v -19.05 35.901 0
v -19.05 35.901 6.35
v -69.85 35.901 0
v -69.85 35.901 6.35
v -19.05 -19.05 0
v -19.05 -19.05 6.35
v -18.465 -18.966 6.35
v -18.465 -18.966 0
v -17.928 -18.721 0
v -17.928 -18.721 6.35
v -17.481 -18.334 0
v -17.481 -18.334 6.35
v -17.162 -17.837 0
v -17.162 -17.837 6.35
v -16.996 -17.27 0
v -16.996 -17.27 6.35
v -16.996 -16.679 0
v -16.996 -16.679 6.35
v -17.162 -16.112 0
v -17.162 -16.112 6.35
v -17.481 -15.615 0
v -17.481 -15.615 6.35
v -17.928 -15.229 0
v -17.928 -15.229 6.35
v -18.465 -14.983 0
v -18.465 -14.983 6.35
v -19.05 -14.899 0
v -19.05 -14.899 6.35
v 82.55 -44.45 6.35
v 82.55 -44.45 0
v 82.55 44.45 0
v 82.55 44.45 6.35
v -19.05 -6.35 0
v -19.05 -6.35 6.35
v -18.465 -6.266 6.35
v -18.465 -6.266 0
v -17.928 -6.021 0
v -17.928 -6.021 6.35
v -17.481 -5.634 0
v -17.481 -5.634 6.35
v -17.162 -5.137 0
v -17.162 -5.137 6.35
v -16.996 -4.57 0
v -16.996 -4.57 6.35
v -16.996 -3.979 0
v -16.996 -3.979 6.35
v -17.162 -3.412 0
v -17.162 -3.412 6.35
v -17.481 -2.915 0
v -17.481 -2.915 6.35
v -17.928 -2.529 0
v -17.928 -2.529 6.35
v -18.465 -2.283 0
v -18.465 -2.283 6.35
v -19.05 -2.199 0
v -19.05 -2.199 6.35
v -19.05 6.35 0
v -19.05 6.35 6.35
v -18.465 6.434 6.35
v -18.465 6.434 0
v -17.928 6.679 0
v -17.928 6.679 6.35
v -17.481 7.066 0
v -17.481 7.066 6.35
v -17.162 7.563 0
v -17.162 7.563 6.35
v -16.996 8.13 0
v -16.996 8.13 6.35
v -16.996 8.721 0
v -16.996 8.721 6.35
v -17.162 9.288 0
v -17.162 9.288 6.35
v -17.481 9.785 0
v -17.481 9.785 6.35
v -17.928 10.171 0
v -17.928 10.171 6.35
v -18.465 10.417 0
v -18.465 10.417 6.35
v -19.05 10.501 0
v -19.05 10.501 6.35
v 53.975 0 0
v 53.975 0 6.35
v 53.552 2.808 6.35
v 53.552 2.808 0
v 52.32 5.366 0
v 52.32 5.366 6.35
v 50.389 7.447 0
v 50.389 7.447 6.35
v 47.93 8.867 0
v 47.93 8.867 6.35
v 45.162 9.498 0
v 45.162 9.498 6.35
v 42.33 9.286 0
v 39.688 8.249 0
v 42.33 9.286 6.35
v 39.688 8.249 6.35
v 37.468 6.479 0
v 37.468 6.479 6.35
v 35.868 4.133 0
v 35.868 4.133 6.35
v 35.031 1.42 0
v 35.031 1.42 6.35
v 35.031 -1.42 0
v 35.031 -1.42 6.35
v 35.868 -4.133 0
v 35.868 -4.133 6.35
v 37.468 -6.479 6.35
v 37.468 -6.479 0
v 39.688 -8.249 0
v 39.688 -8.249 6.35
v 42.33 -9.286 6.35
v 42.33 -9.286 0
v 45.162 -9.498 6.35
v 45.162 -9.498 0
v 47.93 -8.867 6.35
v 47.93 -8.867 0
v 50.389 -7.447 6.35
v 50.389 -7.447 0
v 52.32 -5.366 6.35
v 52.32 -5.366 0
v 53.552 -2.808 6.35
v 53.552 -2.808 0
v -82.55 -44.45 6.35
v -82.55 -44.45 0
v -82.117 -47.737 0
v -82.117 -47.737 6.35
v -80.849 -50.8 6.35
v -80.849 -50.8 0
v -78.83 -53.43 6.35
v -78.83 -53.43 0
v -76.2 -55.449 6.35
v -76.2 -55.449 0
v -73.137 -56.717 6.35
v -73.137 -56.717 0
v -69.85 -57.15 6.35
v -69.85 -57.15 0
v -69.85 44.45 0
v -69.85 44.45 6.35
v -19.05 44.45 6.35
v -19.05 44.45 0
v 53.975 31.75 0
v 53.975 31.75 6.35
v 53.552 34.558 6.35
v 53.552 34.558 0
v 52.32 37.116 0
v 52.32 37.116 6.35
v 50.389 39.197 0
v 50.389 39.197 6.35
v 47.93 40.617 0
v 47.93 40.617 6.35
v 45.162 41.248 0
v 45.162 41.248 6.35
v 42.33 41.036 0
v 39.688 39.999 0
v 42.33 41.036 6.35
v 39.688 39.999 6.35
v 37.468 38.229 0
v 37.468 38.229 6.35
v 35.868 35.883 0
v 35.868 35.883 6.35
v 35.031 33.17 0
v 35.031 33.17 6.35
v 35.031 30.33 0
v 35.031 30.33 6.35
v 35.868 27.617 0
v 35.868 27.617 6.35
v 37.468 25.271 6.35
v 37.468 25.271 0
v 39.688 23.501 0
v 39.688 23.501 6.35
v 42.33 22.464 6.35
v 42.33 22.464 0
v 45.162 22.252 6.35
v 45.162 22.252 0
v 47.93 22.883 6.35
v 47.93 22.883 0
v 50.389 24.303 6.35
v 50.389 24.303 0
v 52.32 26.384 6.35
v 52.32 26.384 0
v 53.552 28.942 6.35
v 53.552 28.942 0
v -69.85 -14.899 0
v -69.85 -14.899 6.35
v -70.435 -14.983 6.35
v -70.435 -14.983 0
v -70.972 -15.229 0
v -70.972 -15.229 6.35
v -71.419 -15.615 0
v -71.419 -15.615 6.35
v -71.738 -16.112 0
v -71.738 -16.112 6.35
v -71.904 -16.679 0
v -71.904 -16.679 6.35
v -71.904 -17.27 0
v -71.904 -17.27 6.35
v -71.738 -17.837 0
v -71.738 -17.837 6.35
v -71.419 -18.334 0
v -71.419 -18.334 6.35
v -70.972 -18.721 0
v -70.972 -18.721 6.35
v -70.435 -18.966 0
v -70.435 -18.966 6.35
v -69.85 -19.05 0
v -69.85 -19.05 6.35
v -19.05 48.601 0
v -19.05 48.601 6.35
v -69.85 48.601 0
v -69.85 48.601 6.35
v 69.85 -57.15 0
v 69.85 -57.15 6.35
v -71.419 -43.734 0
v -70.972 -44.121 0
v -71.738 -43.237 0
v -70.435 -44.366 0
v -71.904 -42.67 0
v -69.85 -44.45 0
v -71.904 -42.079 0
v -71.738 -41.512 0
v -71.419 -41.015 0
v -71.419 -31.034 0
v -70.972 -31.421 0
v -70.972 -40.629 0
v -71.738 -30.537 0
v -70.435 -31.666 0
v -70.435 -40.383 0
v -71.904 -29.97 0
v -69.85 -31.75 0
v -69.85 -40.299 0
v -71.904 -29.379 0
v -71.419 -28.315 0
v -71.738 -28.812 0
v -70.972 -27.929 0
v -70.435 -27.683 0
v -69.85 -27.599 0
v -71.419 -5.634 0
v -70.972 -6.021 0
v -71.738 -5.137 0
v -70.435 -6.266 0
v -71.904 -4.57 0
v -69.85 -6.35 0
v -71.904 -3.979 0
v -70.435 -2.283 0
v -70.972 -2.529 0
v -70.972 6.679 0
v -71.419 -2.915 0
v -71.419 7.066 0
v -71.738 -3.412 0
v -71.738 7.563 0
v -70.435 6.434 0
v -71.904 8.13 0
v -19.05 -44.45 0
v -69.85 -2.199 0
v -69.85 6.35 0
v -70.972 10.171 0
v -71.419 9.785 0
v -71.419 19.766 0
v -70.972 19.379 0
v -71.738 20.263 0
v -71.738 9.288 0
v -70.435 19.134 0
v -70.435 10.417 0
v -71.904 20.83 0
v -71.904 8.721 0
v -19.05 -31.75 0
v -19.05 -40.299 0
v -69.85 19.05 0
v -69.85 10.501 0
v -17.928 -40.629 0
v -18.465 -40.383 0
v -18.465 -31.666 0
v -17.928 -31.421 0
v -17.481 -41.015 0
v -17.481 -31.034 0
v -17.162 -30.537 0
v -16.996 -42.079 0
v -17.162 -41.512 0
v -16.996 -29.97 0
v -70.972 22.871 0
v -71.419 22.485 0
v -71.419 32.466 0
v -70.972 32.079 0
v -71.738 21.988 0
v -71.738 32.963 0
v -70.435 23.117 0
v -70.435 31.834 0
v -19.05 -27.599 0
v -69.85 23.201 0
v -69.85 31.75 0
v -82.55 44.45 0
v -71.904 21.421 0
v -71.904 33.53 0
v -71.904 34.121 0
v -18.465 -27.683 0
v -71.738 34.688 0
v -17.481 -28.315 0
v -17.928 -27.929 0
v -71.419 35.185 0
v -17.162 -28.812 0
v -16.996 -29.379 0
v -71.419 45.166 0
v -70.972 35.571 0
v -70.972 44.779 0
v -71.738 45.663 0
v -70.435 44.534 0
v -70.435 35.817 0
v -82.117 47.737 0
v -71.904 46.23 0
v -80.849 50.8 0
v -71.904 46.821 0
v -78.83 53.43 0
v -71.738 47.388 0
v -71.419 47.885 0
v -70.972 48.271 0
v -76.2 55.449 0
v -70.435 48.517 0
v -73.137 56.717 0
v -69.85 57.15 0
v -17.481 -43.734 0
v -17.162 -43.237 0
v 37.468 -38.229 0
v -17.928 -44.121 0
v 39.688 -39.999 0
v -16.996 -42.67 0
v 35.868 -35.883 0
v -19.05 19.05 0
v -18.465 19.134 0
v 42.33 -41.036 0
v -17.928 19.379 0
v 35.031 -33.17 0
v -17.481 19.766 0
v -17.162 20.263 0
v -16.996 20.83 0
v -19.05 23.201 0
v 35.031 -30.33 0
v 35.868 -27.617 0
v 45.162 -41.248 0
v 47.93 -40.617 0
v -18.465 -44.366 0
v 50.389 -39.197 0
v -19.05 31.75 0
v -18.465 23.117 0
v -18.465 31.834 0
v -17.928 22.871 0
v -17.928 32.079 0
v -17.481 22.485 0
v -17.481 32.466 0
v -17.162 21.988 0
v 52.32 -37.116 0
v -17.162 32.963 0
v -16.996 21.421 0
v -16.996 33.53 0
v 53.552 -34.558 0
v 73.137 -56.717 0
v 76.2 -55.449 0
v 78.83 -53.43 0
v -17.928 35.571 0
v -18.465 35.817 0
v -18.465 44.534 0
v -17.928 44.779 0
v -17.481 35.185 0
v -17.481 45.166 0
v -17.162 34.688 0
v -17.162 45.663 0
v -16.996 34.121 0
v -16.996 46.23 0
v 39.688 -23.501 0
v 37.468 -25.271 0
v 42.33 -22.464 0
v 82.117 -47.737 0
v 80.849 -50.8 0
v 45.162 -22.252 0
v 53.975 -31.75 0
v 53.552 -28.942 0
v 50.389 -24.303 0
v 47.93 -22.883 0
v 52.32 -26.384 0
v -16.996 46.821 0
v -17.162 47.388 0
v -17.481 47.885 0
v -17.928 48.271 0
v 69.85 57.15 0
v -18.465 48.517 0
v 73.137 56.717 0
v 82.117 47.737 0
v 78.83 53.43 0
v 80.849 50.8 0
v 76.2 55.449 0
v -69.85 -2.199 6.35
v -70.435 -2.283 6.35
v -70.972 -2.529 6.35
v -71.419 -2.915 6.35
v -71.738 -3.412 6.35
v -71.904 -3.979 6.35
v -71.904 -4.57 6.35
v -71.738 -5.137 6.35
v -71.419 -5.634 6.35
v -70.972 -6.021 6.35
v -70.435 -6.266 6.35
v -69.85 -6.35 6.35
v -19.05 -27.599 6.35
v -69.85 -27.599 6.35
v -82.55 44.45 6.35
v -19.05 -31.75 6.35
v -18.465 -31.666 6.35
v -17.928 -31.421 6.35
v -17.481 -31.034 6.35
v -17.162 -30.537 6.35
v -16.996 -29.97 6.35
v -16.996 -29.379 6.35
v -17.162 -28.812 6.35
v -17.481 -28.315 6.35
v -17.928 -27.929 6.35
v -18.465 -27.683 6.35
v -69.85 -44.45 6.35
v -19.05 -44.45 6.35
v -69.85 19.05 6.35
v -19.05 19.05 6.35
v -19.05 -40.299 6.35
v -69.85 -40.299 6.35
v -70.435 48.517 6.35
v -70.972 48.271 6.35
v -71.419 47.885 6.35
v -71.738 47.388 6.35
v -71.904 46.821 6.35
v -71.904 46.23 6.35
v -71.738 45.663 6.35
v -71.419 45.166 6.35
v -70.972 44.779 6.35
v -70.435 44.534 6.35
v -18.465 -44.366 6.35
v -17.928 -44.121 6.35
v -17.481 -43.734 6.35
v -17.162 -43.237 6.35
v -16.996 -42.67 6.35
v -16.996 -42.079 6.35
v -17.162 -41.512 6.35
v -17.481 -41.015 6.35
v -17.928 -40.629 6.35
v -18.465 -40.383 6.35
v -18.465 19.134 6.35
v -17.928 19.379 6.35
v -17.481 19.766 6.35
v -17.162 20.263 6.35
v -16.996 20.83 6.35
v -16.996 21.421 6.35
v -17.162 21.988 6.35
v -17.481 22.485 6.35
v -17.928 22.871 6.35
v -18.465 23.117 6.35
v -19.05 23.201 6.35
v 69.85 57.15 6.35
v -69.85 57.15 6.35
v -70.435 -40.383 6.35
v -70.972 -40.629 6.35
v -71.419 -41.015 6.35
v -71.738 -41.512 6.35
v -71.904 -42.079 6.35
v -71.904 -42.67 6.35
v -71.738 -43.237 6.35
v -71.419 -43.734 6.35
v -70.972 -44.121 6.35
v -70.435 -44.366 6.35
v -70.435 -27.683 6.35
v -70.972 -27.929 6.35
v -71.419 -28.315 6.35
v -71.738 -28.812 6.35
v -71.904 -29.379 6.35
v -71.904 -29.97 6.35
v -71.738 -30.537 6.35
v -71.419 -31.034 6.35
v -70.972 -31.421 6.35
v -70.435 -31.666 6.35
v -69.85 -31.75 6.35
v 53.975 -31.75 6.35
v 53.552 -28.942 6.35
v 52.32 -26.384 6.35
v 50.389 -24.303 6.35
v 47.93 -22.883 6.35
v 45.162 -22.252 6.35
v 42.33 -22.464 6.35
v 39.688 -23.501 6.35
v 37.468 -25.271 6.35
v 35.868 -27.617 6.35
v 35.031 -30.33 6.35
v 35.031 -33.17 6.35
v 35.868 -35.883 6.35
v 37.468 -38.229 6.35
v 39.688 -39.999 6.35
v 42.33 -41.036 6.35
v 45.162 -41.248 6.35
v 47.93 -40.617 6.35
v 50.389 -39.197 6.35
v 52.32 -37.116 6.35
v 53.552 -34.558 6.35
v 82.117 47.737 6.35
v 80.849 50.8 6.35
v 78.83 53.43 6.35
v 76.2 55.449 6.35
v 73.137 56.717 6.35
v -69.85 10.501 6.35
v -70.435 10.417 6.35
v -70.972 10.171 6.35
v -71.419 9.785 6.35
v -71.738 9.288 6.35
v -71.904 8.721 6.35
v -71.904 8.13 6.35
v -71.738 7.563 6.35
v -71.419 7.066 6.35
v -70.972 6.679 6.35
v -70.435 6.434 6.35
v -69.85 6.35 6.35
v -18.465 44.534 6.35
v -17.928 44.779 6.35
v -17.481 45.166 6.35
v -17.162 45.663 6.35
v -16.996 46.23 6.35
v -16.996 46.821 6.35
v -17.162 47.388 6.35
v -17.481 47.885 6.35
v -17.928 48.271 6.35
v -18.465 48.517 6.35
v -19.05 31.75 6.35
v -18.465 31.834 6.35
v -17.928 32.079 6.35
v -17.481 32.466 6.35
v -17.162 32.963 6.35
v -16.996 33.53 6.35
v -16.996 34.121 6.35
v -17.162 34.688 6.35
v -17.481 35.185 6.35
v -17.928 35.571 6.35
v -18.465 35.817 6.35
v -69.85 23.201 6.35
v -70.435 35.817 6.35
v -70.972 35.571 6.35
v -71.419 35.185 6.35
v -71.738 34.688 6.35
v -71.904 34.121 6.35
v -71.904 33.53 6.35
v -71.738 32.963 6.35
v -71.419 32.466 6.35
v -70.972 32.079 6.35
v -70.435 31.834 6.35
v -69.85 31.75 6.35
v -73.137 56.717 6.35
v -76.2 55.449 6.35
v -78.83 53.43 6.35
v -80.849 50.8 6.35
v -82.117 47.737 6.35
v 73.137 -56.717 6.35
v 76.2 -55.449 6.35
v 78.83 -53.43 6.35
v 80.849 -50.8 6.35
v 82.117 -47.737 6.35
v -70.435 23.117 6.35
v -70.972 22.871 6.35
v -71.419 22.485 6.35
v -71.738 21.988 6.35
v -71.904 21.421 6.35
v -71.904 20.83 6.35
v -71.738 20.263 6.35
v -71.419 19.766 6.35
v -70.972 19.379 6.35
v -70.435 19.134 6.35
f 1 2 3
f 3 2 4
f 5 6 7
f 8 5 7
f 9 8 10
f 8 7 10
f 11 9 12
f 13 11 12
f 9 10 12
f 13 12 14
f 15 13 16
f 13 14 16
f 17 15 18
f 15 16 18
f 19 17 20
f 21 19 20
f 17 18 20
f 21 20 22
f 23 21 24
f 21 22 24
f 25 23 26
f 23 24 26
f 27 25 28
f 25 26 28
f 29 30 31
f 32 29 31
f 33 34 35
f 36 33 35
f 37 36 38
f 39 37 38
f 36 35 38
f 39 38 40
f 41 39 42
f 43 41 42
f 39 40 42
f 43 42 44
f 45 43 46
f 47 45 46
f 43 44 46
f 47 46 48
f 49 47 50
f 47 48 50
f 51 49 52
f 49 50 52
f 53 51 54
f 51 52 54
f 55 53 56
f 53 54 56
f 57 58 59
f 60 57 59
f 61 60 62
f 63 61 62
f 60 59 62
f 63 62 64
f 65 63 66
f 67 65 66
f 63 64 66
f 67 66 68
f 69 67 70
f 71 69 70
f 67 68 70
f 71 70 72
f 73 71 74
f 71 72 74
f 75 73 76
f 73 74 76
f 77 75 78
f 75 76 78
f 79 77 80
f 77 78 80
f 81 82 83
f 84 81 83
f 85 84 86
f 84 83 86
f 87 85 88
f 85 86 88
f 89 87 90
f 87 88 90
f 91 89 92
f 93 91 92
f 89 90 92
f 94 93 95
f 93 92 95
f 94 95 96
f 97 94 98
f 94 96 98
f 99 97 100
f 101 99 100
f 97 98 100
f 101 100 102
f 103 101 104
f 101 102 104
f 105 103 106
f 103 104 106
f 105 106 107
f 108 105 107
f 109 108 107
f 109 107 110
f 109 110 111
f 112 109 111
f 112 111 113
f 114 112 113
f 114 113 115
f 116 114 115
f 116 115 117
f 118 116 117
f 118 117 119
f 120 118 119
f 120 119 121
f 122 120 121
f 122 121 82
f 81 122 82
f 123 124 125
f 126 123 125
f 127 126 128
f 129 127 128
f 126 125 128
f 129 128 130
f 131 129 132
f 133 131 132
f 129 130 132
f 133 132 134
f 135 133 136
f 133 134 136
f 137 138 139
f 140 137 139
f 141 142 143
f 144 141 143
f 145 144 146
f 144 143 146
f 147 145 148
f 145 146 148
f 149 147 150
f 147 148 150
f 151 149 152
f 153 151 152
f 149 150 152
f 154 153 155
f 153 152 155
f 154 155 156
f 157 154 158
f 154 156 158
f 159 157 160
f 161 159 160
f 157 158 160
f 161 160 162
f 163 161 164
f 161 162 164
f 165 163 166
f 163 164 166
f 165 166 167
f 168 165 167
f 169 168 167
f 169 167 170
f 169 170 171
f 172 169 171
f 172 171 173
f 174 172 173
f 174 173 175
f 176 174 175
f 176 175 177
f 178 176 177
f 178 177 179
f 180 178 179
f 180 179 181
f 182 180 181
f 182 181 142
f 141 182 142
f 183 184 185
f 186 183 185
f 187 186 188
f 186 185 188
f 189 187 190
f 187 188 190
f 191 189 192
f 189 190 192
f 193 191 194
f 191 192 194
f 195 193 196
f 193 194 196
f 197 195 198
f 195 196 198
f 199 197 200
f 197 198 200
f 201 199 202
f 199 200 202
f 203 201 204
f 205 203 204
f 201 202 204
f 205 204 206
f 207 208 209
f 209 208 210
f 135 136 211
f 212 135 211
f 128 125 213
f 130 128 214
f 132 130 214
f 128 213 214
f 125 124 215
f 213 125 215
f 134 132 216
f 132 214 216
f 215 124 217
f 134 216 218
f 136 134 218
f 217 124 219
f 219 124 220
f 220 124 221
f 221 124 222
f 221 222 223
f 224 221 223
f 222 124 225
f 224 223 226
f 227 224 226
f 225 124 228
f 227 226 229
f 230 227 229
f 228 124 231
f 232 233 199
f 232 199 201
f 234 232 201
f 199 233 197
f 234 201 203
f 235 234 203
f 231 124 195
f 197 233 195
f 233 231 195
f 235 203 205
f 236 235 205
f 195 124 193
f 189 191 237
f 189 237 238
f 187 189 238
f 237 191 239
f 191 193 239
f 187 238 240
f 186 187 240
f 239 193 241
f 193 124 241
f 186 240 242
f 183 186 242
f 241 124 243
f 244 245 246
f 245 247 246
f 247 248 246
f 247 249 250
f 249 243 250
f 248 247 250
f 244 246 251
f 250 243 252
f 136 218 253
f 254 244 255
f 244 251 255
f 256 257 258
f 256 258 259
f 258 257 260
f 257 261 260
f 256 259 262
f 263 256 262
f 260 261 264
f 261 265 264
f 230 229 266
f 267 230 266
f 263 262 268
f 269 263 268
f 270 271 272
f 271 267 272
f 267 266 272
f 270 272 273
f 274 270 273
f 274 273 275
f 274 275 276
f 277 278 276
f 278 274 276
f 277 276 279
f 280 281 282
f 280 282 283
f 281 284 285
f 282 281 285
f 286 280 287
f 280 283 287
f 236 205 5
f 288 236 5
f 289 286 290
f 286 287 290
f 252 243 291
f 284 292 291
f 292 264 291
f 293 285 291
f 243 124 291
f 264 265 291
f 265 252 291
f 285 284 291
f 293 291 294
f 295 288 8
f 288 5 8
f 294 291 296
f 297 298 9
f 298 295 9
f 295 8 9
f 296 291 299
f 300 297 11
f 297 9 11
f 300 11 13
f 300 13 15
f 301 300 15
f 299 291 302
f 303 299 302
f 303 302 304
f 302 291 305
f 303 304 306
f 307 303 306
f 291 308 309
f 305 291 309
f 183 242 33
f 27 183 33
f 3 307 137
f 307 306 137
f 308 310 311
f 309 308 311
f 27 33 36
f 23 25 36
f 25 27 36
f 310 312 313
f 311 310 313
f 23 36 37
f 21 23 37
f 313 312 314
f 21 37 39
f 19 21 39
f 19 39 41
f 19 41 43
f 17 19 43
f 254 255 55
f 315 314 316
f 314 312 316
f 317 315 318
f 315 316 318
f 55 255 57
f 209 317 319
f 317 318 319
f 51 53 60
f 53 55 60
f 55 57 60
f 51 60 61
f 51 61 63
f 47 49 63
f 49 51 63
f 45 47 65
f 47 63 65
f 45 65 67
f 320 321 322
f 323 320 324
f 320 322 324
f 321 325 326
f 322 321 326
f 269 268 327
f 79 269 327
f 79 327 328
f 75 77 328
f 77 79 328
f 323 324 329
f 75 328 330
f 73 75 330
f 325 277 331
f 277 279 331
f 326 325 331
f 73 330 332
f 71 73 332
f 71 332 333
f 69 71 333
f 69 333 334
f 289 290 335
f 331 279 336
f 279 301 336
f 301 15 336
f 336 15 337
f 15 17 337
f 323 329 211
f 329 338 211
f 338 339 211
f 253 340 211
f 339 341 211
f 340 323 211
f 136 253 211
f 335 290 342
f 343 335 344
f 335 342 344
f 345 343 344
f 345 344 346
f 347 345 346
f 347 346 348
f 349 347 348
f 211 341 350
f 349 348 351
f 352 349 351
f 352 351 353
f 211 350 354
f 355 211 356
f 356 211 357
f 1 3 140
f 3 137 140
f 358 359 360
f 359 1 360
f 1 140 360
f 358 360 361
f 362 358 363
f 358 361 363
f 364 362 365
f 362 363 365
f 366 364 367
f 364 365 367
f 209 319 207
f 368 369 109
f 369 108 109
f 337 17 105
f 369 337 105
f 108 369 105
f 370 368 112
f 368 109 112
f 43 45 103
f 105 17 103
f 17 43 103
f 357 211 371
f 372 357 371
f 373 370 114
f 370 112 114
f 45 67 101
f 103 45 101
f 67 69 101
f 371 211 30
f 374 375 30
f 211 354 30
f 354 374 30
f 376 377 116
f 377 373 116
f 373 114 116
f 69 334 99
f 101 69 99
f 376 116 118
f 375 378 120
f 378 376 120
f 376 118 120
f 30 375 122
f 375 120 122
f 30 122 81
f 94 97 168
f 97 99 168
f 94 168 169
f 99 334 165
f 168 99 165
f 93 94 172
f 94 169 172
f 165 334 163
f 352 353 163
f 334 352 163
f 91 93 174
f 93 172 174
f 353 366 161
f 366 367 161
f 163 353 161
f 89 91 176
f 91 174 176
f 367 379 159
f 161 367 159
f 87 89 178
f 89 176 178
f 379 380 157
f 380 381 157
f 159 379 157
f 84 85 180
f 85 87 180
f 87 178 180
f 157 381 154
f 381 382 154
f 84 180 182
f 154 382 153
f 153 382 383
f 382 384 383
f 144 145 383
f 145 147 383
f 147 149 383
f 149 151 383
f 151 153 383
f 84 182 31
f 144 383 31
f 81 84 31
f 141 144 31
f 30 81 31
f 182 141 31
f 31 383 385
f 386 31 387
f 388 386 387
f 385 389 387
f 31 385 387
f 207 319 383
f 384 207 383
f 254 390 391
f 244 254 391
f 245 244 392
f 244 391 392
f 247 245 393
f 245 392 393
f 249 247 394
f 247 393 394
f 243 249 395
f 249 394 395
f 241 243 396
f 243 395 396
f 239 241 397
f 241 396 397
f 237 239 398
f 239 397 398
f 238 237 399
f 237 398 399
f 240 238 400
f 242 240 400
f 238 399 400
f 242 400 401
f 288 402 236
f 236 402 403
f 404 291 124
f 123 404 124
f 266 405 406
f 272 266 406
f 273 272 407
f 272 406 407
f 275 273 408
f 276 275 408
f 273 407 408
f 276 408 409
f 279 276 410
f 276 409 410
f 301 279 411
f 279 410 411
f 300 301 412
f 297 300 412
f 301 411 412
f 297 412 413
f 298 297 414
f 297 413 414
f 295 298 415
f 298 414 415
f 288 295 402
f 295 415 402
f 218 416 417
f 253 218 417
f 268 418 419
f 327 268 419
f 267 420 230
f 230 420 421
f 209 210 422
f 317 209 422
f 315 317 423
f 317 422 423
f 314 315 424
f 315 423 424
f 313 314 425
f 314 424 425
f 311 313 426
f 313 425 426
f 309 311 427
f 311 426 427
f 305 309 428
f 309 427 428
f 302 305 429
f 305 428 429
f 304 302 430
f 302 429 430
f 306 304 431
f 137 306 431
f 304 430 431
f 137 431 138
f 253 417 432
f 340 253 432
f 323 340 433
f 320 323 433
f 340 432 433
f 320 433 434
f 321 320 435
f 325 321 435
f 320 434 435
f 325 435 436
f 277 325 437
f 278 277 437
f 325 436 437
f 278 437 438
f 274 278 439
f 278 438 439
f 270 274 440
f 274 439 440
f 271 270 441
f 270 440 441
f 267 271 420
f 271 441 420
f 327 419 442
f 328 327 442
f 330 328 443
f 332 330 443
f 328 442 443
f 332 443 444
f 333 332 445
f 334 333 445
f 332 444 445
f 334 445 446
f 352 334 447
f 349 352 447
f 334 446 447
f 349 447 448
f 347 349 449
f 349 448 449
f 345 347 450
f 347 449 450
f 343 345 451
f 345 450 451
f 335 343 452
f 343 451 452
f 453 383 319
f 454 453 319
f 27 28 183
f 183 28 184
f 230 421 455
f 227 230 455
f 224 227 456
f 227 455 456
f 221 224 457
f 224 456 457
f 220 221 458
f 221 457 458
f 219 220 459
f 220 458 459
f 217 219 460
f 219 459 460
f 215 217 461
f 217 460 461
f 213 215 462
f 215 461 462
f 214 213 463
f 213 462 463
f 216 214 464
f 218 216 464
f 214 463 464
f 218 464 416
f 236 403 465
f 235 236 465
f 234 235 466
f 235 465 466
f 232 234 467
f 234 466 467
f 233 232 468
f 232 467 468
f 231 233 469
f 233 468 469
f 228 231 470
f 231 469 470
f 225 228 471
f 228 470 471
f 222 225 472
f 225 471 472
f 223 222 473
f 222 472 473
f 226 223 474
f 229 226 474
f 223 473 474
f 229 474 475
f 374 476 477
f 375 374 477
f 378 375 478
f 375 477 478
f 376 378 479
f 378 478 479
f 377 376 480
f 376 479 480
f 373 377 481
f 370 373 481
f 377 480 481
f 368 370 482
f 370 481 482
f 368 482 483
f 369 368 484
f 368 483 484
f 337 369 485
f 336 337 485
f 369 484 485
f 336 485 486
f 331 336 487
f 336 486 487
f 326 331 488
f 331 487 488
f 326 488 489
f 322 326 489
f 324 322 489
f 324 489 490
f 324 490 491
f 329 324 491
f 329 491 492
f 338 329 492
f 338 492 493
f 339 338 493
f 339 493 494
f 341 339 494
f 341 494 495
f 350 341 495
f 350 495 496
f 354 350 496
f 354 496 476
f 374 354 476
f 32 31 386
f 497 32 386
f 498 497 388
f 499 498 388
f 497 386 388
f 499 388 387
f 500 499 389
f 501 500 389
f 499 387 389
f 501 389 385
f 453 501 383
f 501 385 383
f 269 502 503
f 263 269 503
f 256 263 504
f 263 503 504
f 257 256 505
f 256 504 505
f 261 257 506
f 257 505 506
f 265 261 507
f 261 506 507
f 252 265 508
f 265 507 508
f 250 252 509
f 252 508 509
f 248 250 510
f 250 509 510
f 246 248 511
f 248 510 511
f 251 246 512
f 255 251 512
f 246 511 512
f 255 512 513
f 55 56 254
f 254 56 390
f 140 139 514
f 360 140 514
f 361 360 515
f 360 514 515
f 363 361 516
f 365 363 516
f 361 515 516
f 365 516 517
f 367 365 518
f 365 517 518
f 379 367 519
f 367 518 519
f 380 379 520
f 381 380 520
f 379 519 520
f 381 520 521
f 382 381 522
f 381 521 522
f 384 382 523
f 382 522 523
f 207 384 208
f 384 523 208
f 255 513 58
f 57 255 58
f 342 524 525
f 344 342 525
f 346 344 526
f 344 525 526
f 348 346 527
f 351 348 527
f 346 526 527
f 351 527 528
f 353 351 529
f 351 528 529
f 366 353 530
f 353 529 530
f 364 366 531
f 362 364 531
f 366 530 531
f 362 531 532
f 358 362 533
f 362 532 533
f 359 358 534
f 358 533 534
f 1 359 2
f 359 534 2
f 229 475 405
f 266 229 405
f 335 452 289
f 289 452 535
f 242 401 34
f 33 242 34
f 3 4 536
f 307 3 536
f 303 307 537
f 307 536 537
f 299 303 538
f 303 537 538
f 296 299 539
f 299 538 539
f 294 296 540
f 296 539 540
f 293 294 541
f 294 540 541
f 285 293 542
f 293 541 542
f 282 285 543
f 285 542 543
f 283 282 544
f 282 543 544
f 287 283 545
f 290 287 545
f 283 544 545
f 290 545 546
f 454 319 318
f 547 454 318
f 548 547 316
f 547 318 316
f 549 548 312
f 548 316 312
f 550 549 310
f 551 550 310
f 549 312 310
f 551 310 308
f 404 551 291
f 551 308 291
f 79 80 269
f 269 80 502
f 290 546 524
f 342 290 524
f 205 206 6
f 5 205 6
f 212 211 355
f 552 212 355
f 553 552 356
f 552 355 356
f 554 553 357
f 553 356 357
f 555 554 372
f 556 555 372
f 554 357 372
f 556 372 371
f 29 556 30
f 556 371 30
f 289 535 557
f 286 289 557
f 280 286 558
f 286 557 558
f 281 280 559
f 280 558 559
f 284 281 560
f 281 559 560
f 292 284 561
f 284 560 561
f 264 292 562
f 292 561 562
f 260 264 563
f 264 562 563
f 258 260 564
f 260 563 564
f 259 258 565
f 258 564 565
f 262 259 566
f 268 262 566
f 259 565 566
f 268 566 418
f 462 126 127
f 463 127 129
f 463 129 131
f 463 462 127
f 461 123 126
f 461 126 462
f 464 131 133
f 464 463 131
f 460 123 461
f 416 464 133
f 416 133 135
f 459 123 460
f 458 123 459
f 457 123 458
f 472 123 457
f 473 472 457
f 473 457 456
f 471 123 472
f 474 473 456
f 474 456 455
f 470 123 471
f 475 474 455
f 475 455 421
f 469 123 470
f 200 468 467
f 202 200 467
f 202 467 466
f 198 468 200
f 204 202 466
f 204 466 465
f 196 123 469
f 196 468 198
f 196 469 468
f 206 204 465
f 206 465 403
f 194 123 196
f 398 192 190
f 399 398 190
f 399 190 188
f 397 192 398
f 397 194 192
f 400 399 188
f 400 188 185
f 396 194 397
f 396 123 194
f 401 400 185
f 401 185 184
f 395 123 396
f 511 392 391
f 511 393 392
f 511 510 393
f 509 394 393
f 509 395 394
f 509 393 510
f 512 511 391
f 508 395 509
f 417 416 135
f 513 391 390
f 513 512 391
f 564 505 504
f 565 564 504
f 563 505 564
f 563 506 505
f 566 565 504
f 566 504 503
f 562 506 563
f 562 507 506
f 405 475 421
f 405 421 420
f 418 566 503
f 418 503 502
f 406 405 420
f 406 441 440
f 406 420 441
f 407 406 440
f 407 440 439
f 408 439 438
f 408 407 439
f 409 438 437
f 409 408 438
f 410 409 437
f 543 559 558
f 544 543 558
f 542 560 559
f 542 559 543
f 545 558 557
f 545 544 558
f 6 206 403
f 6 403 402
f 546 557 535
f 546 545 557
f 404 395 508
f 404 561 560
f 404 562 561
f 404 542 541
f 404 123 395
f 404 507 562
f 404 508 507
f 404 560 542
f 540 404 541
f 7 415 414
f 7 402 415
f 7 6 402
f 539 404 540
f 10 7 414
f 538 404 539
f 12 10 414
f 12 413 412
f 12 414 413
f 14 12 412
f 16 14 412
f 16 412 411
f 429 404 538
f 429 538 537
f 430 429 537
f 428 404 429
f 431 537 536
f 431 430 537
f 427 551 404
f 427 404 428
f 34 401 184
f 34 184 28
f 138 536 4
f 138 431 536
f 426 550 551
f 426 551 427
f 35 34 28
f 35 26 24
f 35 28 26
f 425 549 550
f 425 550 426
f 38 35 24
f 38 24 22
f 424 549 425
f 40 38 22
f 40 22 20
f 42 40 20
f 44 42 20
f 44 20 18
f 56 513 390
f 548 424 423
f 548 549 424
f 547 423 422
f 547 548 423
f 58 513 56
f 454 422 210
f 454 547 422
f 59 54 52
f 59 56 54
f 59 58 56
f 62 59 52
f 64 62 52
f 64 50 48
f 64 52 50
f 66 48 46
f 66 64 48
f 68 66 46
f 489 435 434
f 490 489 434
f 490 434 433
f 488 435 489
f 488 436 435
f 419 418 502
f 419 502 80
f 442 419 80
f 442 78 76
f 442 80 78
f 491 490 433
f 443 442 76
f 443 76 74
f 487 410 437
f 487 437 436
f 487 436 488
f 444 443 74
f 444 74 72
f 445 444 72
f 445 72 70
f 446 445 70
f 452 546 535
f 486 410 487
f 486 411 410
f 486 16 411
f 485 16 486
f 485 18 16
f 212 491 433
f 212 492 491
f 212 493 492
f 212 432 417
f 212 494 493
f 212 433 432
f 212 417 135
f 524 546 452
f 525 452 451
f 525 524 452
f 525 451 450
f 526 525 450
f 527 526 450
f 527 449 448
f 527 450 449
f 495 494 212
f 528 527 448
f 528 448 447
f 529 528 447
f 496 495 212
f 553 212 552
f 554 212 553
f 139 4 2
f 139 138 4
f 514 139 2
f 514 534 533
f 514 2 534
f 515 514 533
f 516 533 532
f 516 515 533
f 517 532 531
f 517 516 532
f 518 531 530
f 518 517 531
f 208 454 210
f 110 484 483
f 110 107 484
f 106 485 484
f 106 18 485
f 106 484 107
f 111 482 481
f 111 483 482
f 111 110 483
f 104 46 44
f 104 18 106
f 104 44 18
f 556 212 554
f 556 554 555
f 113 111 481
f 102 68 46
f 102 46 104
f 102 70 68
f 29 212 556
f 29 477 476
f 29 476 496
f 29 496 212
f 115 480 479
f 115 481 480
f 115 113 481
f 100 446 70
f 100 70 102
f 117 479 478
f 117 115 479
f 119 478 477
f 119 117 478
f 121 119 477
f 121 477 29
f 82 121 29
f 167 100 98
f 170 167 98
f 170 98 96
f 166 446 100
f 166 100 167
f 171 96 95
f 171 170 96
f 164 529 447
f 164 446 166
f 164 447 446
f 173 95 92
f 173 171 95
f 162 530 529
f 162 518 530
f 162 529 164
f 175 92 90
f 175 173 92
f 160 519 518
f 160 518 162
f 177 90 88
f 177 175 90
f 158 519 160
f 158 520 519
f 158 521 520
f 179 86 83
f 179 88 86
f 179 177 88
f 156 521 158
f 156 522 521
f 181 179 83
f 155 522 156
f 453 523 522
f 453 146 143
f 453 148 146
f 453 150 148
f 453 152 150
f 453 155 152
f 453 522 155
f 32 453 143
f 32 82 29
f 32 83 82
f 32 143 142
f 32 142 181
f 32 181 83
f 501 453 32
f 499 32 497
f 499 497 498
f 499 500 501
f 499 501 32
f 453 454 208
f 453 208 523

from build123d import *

# Parameters (mm, degrees)
F1_DEPTH = 6.35
F3_DEPTH = 6.351
F4_R     = 9.525
F5_DEPTH = 6.351


with BuildPart() as f1:
    # F0 (on Top) → F1 (new body)
    with BuildSketch(Plane.XY):
        with BuildLine():
            ThreePointArc((82.55, 44.45), (78.830256, 53.430256), (69.85, 57.15))
            Line((69.85, 57.15), (-69.85, 57.15))
            ThreePointArc((-69.85, 57.15), (-78.830256, 53.430256), (-82.55, 44.45))
            Line((-82.55, 44.45), (-82.55, -44.45))
            ThreePointArc((-82.55, -44.45), (-78.830256, -53.430256), (-69.85, -57.15))
            Line((-69.85, -57.15), (69.85, -57.15))
            ThreePointArc((69.85, -57.15), (78.830256, -53.430256), (82.55, -44.45))
            Line((82.55, -44.45), (82.55, 44.45))
        make_face()
    extrude(amount=F1_DEPTH)

    # F2 (on face) → F3 (cut, through all)
    with BuildSketch(Plane.XY.offset(6.35)):
        with BuildLine():
            ThreePointArc((-69.85, -40.299123), (-71.925438, -42.374562), (-69.85, -44.45))
            Line((-69.85, -44.45), (-19.05, -44.45))
            ThreePointArc((-19.05, -44.45), (-16.974562, -42.374562), (-19.05, -40.299123))
            Line((-19.05, -40.299123), (-69.85, -40.299123))
        make_face()
        with BuildLine():
            Line((-19.05, -27.599123), (-69.85, -27.599123))
            ThreePointArc((-69.85, -27.599123), (-71.925438, -29.674562), (-69.85, -31.75))
            Line((-69.85, -31.75), (-19.05, -31.75))
            ThreePointArc((-19.05, -31.75), (-16.974562, -29.674562), (-19.05, -27.599123))
        make_face()
        with BuildLine():
            Line((-19.05, -14.899123), (-69.85, -14.899123))
            ThreePointArc((-69.85, -14.899123), (-71.925438, -16.974562), (-69.85, -19.05))
            Line((-69.85, -19.05), (-19.05, -19.05))
            ThreePointArc((-19.05, -19.05), (-16.974562, -16.974562), (-19.05, -14.899123))
        make_face()
        with BuildLine():
            Line((-19.05, -2.199123), (-69.85, -2.199123))
            ThreePointArc((-69.85, -2.199123), (-71.925438, -4.274562), (-69.85, -6.35))
            Line((-69.85, -6.35), (-19.05, -6.35))
            ThreePointArc((-19.05, -6.35), (-16.974562, -4.274562), (-19.05, -2.199123))
        make_face()
        with BuildLine():
            Line((-19.05, 10.500877), (-69.85, 10.500877))
            ThreePointArc((-69.85, 10.500877), (-71.925438, 8.425438), (-69.85, 6.35))
            Line((-69.85, 6.35), (-19.05, 6.35))
            ThreePointArc((-19.05, 6.35), (-16.974562, 8.425438), (-19.05, 10.500877))
        make_face()
        with BuildLine():
            Line((-19.05, 23.200877), (-69.85, 23.200877))
            ThreePointArc((-69.85, 23.200877), (-71.925438, 21.125438), (-69.85, 19.05))
            Line((-69.85, 19.05), (-19.05, 19.05))
            ThreePointArc((-19.05, 19.05), (-16.974562, 21.125438), (-19.05, 23.200877))
        make_face()
        with BuildLine():
            Line((-19.05, 35.900877), (-69.85, 35.900877))
            ThreePointArc((-69.85, 35.900877), (-71.925438, 33.825438), (-69.85, 31.75))
            Line((-69.85, 31.75), (-19.05, 31.75))
            ThreePointArc((-19.05, 31.75), (-16.974562, 33.825438), (-19.05, 35.900877))
        make_face()
        with BuildLine():
            Line((-19.05, 48.600877), (-69.85, 48.600877))
            ThreePointArc((-69.85, 48.600877), (-71.925438, 46.525438), (-69.85, 44.45))
            Line((-69.85, 44.45), (-19.05, 44.45))
            ThreePointArc((-19.05, 44.45), (-16.974562, 46.525438), (-19.05, 48.600877))
        make_face()
    extrude(amount=-F3_DEPTH, mode=Mode.SUBTRACT)

    # F4 (on face) → F5 (cut, through all)
    with BuildSketch(Plane.XY.offset(6.35)):
        with Locations((44.45, 0)):
            Circle(F4_R)
        with Locations((44.45, -31.75)):
            Circle(F4_R)
        with Locations((44.45, 31.75)):
            Circle(F4_R)
    extrude(amount=-F5_DEPTH, mode=Mode.SUBTRACT)


solid = f1.part
